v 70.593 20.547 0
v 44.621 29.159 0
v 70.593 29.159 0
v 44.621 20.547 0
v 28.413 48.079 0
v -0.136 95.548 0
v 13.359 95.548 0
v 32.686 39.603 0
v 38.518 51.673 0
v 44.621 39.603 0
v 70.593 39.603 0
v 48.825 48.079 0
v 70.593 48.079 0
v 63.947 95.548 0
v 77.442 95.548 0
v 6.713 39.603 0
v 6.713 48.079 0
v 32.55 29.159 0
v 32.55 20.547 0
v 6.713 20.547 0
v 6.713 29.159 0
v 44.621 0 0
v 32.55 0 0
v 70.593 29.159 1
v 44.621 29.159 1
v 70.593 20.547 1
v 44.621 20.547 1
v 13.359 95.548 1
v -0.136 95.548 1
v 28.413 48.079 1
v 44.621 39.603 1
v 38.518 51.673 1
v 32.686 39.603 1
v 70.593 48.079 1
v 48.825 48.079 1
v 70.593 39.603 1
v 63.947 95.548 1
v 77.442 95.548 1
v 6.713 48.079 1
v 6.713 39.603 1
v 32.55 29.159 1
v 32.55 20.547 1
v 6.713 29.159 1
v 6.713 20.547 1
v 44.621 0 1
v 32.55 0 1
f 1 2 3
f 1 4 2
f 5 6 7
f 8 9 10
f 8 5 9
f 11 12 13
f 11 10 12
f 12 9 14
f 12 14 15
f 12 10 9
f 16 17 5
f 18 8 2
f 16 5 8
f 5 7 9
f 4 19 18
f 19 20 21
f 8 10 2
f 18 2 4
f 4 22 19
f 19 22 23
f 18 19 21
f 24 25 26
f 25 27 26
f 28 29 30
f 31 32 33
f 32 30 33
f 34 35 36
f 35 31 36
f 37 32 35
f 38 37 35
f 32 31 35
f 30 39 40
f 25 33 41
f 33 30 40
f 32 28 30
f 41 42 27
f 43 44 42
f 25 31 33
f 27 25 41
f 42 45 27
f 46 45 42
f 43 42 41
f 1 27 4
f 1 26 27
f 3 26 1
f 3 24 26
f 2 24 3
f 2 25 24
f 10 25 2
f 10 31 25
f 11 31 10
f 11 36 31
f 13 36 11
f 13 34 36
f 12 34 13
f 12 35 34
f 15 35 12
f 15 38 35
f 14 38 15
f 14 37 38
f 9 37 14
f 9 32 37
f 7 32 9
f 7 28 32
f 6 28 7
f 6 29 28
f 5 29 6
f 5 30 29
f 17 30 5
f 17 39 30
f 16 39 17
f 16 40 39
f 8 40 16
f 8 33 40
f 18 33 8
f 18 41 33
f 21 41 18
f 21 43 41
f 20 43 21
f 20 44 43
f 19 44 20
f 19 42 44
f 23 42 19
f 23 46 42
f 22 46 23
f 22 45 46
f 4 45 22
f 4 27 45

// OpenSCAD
module yen(size,thickness) {
    linear_extrude(thickness) {
        text(text="¥",size=size);
    }
}

yen(100,1);
